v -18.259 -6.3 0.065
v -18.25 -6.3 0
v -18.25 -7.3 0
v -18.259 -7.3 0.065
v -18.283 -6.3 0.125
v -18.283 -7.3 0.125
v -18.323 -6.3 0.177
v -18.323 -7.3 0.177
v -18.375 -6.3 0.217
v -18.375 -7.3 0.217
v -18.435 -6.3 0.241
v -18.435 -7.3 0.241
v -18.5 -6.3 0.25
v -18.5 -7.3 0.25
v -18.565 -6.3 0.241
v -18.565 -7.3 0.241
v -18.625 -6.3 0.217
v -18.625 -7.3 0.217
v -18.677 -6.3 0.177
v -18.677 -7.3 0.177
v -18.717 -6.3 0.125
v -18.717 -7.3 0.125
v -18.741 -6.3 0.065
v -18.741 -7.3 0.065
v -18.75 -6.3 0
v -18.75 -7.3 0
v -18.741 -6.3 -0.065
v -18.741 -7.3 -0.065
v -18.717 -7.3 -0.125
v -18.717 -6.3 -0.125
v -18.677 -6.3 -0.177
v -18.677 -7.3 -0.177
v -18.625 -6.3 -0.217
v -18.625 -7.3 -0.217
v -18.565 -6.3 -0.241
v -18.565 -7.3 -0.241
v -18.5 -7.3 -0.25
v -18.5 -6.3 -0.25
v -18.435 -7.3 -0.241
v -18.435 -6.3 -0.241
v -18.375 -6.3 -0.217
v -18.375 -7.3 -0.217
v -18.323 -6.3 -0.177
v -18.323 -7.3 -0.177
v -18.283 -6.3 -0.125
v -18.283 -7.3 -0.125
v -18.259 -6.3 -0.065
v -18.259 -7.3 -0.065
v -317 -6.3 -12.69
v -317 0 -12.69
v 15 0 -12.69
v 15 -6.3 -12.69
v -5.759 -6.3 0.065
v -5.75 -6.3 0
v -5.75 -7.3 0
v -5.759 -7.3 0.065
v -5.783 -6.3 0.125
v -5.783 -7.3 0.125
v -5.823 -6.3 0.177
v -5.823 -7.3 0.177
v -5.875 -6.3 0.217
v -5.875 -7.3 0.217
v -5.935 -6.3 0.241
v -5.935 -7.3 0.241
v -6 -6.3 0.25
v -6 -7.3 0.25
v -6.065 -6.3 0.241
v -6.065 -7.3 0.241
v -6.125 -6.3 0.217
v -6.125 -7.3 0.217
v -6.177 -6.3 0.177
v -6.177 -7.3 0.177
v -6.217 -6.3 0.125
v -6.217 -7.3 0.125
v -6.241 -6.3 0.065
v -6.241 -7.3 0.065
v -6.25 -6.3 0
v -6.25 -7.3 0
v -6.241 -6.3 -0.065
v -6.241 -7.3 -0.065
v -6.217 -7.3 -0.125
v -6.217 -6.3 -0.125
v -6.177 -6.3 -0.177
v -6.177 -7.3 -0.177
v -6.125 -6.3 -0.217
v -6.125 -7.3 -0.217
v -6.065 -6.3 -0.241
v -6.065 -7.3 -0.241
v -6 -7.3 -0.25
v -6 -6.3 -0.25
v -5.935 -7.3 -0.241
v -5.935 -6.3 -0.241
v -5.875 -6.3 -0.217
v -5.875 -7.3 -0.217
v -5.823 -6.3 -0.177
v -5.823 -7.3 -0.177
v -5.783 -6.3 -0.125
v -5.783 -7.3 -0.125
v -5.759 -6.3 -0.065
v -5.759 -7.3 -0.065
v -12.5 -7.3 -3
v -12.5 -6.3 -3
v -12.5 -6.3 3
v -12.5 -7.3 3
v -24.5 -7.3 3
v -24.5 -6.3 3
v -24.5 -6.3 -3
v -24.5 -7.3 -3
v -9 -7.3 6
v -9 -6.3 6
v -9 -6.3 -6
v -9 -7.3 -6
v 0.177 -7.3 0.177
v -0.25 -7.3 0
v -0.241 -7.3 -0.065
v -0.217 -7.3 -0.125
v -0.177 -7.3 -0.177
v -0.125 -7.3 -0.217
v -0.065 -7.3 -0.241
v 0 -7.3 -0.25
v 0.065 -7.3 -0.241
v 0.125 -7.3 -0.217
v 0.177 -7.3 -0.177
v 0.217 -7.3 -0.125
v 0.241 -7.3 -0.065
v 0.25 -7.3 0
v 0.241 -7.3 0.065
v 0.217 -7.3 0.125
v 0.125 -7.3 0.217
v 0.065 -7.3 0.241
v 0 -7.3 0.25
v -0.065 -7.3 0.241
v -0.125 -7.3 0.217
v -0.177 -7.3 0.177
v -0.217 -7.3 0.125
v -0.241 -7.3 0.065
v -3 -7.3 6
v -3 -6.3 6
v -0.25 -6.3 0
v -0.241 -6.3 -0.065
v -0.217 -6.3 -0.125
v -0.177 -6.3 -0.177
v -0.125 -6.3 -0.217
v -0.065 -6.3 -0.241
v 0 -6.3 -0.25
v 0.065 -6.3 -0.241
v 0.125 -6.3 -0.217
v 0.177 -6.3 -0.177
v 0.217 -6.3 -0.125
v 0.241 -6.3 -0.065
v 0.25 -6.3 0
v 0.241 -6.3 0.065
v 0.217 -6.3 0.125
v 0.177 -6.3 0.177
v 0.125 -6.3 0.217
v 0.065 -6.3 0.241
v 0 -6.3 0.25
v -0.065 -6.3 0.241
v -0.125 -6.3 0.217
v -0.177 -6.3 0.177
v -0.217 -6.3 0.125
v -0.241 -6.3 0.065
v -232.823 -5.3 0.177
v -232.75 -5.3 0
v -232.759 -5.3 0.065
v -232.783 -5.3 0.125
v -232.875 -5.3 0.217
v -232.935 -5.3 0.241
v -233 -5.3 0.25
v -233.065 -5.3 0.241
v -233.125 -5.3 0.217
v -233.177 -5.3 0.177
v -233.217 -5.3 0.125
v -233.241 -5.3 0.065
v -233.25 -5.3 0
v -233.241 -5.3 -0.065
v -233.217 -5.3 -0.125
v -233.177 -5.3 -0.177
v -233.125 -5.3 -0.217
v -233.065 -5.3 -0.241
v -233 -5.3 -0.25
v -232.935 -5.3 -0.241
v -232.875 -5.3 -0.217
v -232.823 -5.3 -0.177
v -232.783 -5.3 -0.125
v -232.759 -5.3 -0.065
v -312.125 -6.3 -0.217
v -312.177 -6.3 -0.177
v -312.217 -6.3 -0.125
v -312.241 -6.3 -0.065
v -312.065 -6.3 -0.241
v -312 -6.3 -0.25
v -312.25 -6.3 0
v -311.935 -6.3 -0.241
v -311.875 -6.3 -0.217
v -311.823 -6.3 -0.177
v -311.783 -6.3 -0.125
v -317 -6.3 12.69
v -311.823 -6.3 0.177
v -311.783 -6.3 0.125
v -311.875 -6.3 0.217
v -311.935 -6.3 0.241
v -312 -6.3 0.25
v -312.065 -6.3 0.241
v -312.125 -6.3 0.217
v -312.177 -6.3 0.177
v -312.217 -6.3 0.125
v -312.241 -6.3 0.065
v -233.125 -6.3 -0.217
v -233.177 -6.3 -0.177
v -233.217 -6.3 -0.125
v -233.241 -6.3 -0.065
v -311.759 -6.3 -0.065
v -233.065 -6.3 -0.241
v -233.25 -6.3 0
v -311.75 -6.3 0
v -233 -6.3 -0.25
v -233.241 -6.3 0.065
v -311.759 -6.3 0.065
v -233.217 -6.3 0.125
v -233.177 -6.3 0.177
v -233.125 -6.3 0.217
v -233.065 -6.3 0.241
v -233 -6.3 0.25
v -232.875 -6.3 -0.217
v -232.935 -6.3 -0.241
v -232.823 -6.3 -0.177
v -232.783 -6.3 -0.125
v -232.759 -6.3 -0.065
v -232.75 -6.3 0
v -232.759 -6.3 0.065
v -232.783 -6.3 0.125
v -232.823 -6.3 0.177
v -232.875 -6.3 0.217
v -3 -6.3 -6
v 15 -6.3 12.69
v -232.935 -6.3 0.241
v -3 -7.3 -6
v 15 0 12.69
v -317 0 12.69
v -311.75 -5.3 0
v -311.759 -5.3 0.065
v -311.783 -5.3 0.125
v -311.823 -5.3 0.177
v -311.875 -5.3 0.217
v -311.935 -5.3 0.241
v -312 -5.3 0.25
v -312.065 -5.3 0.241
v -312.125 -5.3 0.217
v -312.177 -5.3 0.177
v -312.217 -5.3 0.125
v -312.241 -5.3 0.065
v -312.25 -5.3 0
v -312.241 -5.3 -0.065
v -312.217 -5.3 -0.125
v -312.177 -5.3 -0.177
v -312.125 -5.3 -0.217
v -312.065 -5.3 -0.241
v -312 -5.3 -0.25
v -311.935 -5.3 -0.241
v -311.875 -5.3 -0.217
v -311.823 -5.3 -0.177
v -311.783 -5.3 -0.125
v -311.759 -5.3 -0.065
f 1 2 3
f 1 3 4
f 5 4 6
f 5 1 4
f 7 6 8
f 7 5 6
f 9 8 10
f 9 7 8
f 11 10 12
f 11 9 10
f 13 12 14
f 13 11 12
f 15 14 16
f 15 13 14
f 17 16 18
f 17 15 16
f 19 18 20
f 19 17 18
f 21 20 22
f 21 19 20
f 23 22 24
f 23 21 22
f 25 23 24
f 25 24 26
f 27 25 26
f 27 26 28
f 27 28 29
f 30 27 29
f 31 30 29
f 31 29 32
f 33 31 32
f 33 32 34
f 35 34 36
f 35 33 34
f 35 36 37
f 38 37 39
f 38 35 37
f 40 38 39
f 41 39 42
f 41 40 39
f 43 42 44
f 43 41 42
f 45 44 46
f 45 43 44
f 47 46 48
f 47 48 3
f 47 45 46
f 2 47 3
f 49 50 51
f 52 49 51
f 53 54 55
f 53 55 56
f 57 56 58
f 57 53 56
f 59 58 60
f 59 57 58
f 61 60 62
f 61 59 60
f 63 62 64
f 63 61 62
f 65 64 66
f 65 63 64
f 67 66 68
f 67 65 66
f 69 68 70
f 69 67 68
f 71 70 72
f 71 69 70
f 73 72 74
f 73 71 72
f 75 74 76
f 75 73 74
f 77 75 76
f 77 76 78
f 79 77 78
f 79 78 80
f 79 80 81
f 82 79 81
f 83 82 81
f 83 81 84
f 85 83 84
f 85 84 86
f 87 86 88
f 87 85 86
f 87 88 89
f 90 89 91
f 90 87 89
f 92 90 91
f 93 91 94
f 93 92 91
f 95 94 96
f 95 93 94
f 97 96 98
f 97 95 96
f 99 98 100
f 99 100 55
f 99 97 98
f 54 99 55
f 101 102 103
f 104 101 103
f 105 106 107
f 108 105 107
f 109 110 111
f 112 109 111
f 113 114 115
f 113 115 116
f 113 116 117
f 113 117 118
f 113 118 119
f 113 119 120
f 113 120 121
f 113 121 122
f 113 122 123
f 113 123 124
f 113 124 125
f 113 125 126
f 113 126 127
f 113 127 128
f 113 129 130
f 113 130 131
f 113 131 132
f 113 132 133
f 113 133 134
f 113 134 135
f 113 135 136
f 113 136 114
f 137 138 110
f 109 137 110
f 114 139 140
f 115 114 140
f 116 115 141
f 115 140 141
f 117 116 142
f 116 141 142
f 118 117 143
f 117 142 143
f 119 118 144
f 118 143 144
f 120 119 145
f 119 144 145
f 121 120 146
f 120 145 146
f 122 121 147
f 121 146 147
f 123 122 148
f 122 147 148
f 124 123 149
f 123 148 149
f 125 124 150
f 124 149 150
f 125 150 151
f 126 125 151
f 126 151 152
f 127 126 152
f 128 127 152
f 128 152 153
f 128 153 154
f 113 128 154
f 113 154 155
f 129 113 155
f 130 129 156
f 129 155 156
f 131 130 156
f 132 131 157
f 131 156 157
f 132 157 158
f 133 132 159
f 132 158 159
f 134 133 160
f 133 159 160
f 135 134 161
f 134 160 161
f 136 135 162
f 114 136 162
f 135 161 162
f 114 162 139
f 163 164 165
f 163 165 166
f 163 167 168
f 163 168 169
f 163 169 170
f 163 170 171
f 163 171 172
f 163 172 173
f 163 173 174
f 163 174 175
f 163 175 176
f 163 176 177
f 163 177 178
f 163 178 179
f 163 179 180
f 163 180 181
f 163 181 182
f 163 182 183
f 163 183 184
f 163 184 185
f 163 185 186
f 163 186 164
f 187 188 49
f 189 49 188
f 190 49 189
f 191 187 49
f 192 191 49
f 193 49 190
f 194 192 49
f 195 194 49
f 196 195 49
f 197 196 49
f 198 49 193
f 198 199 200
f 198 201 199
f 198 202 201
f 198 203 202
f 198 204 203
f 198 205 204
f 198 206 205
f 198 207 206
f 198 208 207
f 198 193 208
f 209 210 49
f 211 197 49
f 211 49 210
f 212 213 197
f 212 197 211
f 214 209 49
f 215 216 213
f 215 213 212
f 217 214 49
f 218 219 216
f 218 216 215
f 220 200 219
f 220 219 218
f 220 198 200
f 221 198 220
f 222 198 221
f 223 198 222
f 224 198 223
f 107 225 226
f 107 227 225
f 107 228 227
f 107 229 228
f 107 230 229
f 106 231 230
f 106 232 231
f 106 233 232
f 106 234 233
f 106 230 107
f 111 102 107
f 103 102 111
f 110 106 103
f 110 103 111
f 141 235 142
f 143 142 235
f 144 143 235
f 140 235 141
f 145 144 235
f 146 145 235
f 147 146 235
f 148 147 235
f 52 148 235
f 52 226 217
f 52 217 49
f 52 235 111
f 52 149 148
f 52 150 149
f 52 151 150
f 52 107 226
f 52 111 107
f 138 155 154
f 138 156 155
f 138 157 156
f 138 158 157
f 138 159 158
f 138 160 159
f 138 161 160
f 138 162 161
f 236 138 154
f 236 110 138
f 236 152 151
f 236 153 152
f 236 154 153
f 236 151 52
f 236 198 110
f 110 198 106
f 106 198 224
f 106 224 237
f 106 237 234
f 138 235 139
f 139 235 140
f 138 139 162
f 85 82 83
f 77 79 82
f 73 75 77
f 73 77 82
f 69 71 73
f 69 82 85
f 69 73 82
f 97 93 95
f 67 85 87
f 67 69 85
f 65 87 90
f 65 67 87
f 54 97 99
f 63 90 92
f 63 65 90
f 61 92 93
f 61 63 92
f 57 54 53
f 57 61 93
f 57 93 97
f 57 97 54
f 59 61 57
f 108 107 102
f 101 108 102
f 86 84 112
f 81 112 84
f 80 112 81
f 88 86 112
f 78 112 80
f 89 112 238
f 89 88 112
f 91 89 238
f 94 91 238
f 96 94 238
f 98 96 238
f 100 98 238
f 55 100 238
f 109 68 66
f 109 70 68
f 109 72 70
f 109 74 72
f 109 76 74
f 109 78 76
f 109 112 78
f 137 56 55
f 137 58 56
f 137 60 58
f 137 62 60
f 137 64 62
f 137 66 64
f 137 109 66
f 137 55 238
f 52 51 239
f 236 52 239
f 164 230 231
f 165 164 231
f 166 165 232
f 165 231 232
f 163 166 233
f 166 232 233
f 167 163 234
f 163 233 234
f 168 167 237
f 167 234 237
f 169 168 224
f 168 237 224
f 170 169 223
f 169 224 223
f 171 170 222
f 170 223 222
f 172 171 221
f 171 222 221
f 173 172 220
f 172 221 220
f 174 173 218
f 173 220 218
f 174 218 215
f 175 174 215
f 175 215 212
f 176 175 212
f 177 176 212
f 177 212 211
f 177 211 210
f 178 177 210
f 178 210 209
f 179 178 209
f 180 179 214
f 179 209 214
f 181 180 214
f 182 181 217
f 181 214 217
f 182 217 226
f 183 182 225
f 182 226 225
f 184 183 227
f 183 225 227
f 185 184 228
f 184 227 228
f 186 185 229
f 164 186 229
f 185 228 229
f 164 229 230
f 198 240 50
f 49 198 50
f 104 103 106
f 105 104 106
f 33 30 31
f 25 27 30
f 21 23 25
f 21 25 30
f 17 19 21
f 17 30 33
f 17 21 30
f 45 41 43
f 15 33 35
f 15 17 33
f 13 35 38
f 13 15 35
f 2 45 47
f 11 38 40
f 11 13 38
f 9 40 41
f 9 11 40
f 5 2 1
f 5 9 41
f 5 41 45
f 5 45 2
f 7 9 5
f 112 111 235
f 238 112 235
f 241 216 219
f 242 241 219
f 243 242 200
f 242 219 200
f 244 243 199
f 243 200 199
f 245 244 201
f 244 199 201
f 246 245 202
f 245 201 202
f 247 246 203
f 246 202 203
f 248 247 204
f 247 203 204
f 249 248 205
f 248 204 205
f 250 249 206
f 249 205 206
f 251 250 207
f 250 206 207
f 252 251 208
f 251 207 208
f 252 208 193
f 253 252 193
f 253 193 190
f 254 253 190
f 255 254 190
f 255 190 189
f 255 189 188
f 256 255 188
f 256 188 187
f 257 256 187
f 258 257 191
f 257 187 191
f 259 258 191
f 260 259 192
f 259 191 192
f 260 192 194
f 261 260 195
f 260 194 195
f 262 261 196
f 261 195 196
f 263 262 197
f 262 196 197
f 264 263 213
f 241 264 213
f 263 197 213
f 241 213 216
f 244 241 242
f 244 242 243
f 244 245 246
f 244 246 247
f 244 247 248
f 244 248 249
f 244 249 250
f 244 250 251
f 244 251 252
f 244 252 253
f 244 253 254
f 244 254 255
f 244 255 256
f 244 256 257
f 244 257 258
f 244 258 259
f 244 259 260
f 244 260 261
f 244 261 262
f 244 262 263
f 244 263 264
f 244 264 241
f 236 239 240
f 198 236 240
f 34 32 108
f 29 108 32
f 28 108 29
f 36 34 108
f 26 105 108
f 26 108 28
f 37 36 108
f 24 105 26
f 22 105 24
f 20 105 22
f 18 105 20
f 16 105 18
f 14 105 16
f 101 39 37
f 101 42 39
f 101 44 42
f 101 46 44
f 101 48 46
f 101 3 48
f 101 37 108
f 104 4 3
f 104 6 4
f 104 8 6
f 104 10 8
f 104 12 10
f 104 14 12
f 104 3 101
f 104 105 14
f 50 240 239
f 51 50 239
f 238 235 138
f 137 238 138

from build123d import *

# Parameters (mm, degrees)
F1_DEPTH = 6.3
F2_R     = 0.25
F3_DEPTH = 1
F4_R     = 0.25
F5_DEPTH = 1
F7_R     = 0.25
F8_DEPTH = 1
F6_R     = 0.25
F9_DEPTH = 1


with BuildPart() as f1:
    # F0 (on Front) → F1 (new body)
    with BuildSketch(Plane.XZ):
        Polygon((0, -12.69), (0, 0), (0, 12.69), (-317, 12.69), (-317, -12.69), align=None)
        Polygon((0, 12.69), (0, 0), (0, -12.69), (15, -12.69), (15, 12.69), align=None)
    extrude(amount=F1_DEPTH)

    # F2 (on face) → F3 (cut)
    with BuildSketch(Plane.XZ.offset(6.3)):
        with Locations((-312, 0)):
            Circle(F2_R)
    extrude(amount=-F3_DEPTH, mode=Mode.SUBTRACT)

    # F4 (on face) → F5 (cut)
    with BuildSketch(Plane.XZ.offset(6.3)):
        with Locations((-233, 0)):
            Circle(F4_R)
    extrude(amount=-F5_DEPTH, mode=Mode.SUBTRACT)

    # F7 (on face) → F8 (join)
    with BuildSketch(Plane.XZ.offset(6.3)):
        with BuildLine():
            ThreePointArc((0.25, 0), (0, 0.25), (-0.25, 0))
            ThreePointArc((-0.25, 0), (0, -0.25), (0.25, 0))
        make_face()
        with Locations((-6, 0)):
            Circle(F7_R)
        Polygon((-9, 6), (-9, 0), (-9, -6), (-3, -6), (-3, 0), (-3, 6), align=None)
        with Locations((-6, 0)):
            Circle(F7_R, mode=Mode.SUBTRACT)
    extrude(amount=F8_DEPTH)

    # F6 (on face) → F9 (join)
    with BuildSketch(Plane.XZ.offset(6.3)):
        with Locations((-18.5, 0)):
            Circle(F6_R)
        Polygon((-24.5, 3), (-24.5, 0), (-24.5, -3), (-18.5, -3), (-12.5, -3), (-12.5, 0), (-12.5, 3), (-18.5, 3), align=None)
        with Locations((-18.5, 0)):
            Circle(F6_R, mode=Mode.SUBTRACT)
    extrude(amount=F9_DEPTH)


solid = f1.part
